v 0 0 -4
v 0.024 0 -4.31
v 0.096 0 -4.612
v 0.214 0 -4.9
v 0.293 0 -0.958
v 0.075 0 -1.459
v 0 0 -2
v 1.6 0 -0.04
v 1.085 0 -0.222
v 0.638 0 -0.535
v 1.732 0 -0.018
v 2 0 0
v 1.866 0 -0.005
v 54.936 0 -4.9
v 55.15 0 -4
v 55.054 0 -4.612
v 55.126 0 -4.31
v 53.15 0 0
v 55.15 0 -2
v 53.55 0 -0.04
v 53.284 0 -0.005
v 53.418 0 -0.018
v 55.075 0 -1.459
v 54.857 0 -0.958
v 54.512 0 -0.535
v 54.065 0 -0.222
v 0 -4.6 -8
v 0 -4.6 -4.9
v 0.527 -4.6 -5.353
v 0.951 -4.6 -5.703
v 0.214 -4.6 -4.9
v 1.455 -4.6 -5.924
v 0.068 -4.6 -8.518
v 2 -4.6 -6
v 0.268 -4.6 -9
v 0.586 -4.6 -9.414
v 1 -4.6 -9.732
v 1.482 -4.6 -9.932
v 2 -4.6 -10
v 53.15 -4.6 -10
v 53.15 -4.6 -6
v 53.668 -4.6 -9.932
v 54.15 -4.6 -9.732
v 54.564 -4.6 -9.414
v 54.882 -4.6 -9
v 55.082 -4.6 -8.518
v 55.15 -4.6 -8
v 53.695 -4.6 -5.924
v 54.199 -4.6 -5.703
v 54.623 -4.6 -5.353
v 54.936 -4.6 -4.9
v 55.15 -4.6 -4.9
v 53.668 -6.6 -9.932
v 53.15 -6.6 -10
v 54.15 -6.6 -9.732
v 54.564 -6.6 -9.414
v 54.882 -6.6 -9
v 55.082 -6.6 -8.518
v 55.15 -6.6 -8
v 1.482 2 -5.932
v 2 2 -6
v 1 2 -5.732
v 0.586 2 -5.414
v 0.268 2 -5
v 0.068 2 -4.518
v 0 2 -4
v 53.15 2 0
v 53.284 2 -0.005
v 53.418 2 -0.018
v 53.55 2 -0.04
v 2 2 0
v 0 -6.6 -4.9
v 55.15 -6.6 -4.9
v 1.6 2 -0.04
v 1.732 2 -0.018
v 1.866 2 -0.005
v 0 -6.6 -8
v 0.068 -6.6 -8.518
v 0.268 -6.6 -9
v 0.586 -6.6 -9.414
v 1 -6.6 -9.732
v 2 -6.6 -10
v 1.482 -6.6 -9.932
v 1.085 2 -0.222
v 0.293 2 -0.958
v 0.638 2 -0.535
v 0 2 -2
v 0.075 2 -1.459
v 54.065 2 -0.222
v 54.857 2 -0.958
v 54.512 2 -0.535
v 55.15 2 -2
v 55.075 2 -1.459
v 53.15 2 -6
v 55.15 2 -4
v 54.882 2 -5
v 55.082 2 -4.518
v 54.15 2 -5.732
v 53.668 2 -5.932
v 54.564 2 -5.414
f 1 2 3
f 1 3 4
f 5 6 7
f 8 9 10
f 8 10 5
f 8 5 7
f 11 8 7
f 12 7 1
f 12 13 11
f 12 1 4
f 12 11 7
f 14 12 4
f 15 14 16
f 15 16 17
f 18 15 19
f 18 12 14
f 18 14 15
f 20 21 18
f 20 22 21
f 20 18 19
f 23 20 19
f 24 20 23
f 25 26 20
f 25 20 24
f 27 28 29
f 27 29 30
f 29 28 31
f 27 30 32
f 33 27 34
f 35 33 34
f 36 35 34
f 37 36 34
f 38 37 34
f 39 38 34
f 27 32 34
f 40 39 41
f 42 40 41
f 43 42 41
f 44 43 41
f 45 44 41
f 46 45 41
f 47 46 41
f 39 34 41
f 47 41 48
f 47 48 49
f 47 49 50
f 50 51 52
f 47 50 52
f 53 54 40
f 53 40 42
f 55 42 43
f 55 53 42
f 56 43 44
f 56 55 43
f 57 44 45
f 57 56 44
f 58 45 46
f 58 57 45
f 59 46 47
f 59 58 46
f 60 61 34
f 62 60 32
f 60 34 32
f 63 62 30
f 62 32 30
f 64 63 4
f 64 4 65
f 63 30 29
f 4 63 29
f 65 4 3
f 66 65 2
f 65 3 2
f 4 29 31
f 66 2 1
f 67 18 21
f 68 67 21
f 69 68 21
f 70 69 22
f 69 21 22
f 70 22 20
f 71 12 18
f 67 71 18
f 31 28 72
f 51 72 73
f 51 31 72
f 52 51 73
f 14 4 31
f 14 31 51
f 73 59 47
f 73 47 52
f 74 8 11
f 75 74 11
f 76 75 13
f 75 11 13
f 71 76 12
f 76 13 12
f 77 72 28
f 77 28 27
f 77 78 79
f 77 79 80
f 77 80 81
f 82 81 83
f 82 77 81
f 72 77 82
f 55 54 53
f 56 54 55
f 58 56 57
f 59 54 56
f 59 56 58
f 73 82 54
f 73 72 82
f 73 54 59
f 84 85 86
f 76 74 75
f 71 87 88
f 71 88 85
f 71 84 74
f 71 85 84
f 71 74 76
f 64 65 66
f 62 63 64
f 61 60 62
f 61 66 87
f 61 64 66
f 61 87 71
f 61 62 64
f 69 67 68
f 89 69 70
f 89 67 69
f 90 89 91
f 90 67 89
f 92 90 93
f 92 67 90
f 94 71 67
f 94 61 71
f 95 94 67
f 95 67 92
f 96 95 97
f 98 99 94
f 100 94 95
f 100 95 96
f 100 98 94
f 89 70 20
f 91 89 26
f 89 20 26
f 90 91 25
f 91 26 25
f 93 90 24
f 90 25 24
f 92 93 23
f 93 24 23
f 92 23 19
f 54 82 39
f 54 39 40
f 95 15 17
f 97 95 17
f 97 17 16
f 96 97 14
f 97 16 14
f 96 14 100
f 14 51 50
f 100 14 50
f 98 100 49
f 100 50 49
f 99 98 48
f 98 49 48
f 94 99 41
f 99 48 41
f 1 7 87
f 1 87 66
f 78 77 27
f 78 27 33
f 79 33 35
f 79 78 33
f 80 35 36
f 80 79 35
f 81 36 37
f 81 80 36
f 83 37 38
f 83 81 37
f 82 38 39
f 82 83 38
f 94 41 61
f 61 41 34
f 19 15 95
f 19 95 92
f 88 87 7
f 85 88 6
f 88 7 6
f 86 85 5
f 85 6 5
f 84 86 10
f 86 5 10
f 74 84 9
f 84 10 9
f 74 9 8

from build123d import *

# Parameters (mm, degrees)
BOSS_EXTRUDE1_DEPTH = 2
BOSS_EXTRUDE2_START = -8.6
BOSS_EXTRUDE2_DEPTH = 8.6
BOSS_EXTRUDE3_DEPTH = 2
SKETCH8_W           = 55.15
SKETCH8_H           = 4.9
CUT_EXTRUDE3_DEPTH  = 57.436535152


with BuildPart() as part:
    # Sketch1 → Boss-Extrude1 (new body)
    with BuildSketch(Plane(origin=(0, 0, 0), x_dir=(1, 0, 0), z_dir=(0, 1, 0))):
        with BuildLine():
            Line((2, 0), (53.15, 0))
            ThreePointArc((53.15, 0), (54.564213562, 0.585786438), (55.15, 2))
            Line((55.15, 2), (55.15, 4))
            ThreePointArc((55.15, 4), (54.564213562, 5.414213562), (53.15, 6))
            Line((53.15, 6), (2, 6))
            ThreePointArc((2, 6), (0.585786438, 5.414213562), (0, 4))
            Line((0, 4), (0, 2))
            ThreePointArc((0, 2), (0.585786438, 0.585786438), (2, 0))
        make_face()
    extrude(amount=BOSS_EXTRUDE1_DEPTH)

    # Sketch2 → Boss-Extrude2 (add)
    with BuildSketch(Plane(origin=(0, 2, 0), x_dir=(1, 0, 0), z_dir=(0, 1, 0)).offset(BOSS_EXTRUDE2_START)):
        with BuildLine():
            Line((1.6, 0.040408206), (1.6, 2.5))
            ThreePointArc((1.6, 2.5), (2.302943725, 4.197056275), (4, 4.9))
            Line((4, 4.9), (51.15, 4.9))
            ThreePointArc((51.15, 4.9), (52.847056275, 4.197056275), (53.55, 2.5))
            Line((53.55, 2.5), (53.55, 0.040408206))
            ThreePointArc((53.55, 0.040408206), (54.699193338, 0.735088936), (55.15, 2))
            Line((55.15, 2), (55.15, 4))
            ThreePointArc((55.15, 4), (54.564213562, 5.414213562), (53.15, 6))
            Line((53.15, 6), (2, 6))
            ThreePointArc((2, 6), (0.585786438, 5.414213562), (0, 4))
            Line((0, 4), (0, 2))
            ThreePointArc((0, 2), (0.450806662, 0.735088936), (1.6, 0.040408206))
        make_face()
    extrude(amount=BOSS_EXTRUDE2_DEPTH)

    # Sketch4 → Boss-Extrude3 (add)
    with BuildSketch(Plane.XZ.offset(6.6)):
        with BuildLine():
            Line((0, -4), (0, -8))
            ThreePointArc((0, -8), (0.585786438, -9.414213562), (2, -10))
            Line((2, -10), (53.15, -10))
            ThreePointArc((53.15, -10), (54.564213562, -9.414213562), (55.15, -8))
            Line((55.15, -8), (55.15, -4))
            ThreePointArc((55.15, -4), (54.564213562, -5.414213562), (53.15, -6))
            Line((53.15, -6), (2, -6))
            ThreePointArc((2, -6), (0.585786438, -5.414213562), (0, -4))
        make_face()
    extrude(amount=-BOSS_EXTRUDE3_DEPTH)

    # Sketch8 → Cut-Extrude3 (cut, through all)
    with BuildSketch(Plane.XZ):
        with Locations((27.575, -2.45)):
            Rectangle(SKETCH8_W, SKETCH8_H)
    extrude(amount=CUT_EXTRUDE3_DEPTH, mode=Mode.SUBTRACT)


solid = part.part
